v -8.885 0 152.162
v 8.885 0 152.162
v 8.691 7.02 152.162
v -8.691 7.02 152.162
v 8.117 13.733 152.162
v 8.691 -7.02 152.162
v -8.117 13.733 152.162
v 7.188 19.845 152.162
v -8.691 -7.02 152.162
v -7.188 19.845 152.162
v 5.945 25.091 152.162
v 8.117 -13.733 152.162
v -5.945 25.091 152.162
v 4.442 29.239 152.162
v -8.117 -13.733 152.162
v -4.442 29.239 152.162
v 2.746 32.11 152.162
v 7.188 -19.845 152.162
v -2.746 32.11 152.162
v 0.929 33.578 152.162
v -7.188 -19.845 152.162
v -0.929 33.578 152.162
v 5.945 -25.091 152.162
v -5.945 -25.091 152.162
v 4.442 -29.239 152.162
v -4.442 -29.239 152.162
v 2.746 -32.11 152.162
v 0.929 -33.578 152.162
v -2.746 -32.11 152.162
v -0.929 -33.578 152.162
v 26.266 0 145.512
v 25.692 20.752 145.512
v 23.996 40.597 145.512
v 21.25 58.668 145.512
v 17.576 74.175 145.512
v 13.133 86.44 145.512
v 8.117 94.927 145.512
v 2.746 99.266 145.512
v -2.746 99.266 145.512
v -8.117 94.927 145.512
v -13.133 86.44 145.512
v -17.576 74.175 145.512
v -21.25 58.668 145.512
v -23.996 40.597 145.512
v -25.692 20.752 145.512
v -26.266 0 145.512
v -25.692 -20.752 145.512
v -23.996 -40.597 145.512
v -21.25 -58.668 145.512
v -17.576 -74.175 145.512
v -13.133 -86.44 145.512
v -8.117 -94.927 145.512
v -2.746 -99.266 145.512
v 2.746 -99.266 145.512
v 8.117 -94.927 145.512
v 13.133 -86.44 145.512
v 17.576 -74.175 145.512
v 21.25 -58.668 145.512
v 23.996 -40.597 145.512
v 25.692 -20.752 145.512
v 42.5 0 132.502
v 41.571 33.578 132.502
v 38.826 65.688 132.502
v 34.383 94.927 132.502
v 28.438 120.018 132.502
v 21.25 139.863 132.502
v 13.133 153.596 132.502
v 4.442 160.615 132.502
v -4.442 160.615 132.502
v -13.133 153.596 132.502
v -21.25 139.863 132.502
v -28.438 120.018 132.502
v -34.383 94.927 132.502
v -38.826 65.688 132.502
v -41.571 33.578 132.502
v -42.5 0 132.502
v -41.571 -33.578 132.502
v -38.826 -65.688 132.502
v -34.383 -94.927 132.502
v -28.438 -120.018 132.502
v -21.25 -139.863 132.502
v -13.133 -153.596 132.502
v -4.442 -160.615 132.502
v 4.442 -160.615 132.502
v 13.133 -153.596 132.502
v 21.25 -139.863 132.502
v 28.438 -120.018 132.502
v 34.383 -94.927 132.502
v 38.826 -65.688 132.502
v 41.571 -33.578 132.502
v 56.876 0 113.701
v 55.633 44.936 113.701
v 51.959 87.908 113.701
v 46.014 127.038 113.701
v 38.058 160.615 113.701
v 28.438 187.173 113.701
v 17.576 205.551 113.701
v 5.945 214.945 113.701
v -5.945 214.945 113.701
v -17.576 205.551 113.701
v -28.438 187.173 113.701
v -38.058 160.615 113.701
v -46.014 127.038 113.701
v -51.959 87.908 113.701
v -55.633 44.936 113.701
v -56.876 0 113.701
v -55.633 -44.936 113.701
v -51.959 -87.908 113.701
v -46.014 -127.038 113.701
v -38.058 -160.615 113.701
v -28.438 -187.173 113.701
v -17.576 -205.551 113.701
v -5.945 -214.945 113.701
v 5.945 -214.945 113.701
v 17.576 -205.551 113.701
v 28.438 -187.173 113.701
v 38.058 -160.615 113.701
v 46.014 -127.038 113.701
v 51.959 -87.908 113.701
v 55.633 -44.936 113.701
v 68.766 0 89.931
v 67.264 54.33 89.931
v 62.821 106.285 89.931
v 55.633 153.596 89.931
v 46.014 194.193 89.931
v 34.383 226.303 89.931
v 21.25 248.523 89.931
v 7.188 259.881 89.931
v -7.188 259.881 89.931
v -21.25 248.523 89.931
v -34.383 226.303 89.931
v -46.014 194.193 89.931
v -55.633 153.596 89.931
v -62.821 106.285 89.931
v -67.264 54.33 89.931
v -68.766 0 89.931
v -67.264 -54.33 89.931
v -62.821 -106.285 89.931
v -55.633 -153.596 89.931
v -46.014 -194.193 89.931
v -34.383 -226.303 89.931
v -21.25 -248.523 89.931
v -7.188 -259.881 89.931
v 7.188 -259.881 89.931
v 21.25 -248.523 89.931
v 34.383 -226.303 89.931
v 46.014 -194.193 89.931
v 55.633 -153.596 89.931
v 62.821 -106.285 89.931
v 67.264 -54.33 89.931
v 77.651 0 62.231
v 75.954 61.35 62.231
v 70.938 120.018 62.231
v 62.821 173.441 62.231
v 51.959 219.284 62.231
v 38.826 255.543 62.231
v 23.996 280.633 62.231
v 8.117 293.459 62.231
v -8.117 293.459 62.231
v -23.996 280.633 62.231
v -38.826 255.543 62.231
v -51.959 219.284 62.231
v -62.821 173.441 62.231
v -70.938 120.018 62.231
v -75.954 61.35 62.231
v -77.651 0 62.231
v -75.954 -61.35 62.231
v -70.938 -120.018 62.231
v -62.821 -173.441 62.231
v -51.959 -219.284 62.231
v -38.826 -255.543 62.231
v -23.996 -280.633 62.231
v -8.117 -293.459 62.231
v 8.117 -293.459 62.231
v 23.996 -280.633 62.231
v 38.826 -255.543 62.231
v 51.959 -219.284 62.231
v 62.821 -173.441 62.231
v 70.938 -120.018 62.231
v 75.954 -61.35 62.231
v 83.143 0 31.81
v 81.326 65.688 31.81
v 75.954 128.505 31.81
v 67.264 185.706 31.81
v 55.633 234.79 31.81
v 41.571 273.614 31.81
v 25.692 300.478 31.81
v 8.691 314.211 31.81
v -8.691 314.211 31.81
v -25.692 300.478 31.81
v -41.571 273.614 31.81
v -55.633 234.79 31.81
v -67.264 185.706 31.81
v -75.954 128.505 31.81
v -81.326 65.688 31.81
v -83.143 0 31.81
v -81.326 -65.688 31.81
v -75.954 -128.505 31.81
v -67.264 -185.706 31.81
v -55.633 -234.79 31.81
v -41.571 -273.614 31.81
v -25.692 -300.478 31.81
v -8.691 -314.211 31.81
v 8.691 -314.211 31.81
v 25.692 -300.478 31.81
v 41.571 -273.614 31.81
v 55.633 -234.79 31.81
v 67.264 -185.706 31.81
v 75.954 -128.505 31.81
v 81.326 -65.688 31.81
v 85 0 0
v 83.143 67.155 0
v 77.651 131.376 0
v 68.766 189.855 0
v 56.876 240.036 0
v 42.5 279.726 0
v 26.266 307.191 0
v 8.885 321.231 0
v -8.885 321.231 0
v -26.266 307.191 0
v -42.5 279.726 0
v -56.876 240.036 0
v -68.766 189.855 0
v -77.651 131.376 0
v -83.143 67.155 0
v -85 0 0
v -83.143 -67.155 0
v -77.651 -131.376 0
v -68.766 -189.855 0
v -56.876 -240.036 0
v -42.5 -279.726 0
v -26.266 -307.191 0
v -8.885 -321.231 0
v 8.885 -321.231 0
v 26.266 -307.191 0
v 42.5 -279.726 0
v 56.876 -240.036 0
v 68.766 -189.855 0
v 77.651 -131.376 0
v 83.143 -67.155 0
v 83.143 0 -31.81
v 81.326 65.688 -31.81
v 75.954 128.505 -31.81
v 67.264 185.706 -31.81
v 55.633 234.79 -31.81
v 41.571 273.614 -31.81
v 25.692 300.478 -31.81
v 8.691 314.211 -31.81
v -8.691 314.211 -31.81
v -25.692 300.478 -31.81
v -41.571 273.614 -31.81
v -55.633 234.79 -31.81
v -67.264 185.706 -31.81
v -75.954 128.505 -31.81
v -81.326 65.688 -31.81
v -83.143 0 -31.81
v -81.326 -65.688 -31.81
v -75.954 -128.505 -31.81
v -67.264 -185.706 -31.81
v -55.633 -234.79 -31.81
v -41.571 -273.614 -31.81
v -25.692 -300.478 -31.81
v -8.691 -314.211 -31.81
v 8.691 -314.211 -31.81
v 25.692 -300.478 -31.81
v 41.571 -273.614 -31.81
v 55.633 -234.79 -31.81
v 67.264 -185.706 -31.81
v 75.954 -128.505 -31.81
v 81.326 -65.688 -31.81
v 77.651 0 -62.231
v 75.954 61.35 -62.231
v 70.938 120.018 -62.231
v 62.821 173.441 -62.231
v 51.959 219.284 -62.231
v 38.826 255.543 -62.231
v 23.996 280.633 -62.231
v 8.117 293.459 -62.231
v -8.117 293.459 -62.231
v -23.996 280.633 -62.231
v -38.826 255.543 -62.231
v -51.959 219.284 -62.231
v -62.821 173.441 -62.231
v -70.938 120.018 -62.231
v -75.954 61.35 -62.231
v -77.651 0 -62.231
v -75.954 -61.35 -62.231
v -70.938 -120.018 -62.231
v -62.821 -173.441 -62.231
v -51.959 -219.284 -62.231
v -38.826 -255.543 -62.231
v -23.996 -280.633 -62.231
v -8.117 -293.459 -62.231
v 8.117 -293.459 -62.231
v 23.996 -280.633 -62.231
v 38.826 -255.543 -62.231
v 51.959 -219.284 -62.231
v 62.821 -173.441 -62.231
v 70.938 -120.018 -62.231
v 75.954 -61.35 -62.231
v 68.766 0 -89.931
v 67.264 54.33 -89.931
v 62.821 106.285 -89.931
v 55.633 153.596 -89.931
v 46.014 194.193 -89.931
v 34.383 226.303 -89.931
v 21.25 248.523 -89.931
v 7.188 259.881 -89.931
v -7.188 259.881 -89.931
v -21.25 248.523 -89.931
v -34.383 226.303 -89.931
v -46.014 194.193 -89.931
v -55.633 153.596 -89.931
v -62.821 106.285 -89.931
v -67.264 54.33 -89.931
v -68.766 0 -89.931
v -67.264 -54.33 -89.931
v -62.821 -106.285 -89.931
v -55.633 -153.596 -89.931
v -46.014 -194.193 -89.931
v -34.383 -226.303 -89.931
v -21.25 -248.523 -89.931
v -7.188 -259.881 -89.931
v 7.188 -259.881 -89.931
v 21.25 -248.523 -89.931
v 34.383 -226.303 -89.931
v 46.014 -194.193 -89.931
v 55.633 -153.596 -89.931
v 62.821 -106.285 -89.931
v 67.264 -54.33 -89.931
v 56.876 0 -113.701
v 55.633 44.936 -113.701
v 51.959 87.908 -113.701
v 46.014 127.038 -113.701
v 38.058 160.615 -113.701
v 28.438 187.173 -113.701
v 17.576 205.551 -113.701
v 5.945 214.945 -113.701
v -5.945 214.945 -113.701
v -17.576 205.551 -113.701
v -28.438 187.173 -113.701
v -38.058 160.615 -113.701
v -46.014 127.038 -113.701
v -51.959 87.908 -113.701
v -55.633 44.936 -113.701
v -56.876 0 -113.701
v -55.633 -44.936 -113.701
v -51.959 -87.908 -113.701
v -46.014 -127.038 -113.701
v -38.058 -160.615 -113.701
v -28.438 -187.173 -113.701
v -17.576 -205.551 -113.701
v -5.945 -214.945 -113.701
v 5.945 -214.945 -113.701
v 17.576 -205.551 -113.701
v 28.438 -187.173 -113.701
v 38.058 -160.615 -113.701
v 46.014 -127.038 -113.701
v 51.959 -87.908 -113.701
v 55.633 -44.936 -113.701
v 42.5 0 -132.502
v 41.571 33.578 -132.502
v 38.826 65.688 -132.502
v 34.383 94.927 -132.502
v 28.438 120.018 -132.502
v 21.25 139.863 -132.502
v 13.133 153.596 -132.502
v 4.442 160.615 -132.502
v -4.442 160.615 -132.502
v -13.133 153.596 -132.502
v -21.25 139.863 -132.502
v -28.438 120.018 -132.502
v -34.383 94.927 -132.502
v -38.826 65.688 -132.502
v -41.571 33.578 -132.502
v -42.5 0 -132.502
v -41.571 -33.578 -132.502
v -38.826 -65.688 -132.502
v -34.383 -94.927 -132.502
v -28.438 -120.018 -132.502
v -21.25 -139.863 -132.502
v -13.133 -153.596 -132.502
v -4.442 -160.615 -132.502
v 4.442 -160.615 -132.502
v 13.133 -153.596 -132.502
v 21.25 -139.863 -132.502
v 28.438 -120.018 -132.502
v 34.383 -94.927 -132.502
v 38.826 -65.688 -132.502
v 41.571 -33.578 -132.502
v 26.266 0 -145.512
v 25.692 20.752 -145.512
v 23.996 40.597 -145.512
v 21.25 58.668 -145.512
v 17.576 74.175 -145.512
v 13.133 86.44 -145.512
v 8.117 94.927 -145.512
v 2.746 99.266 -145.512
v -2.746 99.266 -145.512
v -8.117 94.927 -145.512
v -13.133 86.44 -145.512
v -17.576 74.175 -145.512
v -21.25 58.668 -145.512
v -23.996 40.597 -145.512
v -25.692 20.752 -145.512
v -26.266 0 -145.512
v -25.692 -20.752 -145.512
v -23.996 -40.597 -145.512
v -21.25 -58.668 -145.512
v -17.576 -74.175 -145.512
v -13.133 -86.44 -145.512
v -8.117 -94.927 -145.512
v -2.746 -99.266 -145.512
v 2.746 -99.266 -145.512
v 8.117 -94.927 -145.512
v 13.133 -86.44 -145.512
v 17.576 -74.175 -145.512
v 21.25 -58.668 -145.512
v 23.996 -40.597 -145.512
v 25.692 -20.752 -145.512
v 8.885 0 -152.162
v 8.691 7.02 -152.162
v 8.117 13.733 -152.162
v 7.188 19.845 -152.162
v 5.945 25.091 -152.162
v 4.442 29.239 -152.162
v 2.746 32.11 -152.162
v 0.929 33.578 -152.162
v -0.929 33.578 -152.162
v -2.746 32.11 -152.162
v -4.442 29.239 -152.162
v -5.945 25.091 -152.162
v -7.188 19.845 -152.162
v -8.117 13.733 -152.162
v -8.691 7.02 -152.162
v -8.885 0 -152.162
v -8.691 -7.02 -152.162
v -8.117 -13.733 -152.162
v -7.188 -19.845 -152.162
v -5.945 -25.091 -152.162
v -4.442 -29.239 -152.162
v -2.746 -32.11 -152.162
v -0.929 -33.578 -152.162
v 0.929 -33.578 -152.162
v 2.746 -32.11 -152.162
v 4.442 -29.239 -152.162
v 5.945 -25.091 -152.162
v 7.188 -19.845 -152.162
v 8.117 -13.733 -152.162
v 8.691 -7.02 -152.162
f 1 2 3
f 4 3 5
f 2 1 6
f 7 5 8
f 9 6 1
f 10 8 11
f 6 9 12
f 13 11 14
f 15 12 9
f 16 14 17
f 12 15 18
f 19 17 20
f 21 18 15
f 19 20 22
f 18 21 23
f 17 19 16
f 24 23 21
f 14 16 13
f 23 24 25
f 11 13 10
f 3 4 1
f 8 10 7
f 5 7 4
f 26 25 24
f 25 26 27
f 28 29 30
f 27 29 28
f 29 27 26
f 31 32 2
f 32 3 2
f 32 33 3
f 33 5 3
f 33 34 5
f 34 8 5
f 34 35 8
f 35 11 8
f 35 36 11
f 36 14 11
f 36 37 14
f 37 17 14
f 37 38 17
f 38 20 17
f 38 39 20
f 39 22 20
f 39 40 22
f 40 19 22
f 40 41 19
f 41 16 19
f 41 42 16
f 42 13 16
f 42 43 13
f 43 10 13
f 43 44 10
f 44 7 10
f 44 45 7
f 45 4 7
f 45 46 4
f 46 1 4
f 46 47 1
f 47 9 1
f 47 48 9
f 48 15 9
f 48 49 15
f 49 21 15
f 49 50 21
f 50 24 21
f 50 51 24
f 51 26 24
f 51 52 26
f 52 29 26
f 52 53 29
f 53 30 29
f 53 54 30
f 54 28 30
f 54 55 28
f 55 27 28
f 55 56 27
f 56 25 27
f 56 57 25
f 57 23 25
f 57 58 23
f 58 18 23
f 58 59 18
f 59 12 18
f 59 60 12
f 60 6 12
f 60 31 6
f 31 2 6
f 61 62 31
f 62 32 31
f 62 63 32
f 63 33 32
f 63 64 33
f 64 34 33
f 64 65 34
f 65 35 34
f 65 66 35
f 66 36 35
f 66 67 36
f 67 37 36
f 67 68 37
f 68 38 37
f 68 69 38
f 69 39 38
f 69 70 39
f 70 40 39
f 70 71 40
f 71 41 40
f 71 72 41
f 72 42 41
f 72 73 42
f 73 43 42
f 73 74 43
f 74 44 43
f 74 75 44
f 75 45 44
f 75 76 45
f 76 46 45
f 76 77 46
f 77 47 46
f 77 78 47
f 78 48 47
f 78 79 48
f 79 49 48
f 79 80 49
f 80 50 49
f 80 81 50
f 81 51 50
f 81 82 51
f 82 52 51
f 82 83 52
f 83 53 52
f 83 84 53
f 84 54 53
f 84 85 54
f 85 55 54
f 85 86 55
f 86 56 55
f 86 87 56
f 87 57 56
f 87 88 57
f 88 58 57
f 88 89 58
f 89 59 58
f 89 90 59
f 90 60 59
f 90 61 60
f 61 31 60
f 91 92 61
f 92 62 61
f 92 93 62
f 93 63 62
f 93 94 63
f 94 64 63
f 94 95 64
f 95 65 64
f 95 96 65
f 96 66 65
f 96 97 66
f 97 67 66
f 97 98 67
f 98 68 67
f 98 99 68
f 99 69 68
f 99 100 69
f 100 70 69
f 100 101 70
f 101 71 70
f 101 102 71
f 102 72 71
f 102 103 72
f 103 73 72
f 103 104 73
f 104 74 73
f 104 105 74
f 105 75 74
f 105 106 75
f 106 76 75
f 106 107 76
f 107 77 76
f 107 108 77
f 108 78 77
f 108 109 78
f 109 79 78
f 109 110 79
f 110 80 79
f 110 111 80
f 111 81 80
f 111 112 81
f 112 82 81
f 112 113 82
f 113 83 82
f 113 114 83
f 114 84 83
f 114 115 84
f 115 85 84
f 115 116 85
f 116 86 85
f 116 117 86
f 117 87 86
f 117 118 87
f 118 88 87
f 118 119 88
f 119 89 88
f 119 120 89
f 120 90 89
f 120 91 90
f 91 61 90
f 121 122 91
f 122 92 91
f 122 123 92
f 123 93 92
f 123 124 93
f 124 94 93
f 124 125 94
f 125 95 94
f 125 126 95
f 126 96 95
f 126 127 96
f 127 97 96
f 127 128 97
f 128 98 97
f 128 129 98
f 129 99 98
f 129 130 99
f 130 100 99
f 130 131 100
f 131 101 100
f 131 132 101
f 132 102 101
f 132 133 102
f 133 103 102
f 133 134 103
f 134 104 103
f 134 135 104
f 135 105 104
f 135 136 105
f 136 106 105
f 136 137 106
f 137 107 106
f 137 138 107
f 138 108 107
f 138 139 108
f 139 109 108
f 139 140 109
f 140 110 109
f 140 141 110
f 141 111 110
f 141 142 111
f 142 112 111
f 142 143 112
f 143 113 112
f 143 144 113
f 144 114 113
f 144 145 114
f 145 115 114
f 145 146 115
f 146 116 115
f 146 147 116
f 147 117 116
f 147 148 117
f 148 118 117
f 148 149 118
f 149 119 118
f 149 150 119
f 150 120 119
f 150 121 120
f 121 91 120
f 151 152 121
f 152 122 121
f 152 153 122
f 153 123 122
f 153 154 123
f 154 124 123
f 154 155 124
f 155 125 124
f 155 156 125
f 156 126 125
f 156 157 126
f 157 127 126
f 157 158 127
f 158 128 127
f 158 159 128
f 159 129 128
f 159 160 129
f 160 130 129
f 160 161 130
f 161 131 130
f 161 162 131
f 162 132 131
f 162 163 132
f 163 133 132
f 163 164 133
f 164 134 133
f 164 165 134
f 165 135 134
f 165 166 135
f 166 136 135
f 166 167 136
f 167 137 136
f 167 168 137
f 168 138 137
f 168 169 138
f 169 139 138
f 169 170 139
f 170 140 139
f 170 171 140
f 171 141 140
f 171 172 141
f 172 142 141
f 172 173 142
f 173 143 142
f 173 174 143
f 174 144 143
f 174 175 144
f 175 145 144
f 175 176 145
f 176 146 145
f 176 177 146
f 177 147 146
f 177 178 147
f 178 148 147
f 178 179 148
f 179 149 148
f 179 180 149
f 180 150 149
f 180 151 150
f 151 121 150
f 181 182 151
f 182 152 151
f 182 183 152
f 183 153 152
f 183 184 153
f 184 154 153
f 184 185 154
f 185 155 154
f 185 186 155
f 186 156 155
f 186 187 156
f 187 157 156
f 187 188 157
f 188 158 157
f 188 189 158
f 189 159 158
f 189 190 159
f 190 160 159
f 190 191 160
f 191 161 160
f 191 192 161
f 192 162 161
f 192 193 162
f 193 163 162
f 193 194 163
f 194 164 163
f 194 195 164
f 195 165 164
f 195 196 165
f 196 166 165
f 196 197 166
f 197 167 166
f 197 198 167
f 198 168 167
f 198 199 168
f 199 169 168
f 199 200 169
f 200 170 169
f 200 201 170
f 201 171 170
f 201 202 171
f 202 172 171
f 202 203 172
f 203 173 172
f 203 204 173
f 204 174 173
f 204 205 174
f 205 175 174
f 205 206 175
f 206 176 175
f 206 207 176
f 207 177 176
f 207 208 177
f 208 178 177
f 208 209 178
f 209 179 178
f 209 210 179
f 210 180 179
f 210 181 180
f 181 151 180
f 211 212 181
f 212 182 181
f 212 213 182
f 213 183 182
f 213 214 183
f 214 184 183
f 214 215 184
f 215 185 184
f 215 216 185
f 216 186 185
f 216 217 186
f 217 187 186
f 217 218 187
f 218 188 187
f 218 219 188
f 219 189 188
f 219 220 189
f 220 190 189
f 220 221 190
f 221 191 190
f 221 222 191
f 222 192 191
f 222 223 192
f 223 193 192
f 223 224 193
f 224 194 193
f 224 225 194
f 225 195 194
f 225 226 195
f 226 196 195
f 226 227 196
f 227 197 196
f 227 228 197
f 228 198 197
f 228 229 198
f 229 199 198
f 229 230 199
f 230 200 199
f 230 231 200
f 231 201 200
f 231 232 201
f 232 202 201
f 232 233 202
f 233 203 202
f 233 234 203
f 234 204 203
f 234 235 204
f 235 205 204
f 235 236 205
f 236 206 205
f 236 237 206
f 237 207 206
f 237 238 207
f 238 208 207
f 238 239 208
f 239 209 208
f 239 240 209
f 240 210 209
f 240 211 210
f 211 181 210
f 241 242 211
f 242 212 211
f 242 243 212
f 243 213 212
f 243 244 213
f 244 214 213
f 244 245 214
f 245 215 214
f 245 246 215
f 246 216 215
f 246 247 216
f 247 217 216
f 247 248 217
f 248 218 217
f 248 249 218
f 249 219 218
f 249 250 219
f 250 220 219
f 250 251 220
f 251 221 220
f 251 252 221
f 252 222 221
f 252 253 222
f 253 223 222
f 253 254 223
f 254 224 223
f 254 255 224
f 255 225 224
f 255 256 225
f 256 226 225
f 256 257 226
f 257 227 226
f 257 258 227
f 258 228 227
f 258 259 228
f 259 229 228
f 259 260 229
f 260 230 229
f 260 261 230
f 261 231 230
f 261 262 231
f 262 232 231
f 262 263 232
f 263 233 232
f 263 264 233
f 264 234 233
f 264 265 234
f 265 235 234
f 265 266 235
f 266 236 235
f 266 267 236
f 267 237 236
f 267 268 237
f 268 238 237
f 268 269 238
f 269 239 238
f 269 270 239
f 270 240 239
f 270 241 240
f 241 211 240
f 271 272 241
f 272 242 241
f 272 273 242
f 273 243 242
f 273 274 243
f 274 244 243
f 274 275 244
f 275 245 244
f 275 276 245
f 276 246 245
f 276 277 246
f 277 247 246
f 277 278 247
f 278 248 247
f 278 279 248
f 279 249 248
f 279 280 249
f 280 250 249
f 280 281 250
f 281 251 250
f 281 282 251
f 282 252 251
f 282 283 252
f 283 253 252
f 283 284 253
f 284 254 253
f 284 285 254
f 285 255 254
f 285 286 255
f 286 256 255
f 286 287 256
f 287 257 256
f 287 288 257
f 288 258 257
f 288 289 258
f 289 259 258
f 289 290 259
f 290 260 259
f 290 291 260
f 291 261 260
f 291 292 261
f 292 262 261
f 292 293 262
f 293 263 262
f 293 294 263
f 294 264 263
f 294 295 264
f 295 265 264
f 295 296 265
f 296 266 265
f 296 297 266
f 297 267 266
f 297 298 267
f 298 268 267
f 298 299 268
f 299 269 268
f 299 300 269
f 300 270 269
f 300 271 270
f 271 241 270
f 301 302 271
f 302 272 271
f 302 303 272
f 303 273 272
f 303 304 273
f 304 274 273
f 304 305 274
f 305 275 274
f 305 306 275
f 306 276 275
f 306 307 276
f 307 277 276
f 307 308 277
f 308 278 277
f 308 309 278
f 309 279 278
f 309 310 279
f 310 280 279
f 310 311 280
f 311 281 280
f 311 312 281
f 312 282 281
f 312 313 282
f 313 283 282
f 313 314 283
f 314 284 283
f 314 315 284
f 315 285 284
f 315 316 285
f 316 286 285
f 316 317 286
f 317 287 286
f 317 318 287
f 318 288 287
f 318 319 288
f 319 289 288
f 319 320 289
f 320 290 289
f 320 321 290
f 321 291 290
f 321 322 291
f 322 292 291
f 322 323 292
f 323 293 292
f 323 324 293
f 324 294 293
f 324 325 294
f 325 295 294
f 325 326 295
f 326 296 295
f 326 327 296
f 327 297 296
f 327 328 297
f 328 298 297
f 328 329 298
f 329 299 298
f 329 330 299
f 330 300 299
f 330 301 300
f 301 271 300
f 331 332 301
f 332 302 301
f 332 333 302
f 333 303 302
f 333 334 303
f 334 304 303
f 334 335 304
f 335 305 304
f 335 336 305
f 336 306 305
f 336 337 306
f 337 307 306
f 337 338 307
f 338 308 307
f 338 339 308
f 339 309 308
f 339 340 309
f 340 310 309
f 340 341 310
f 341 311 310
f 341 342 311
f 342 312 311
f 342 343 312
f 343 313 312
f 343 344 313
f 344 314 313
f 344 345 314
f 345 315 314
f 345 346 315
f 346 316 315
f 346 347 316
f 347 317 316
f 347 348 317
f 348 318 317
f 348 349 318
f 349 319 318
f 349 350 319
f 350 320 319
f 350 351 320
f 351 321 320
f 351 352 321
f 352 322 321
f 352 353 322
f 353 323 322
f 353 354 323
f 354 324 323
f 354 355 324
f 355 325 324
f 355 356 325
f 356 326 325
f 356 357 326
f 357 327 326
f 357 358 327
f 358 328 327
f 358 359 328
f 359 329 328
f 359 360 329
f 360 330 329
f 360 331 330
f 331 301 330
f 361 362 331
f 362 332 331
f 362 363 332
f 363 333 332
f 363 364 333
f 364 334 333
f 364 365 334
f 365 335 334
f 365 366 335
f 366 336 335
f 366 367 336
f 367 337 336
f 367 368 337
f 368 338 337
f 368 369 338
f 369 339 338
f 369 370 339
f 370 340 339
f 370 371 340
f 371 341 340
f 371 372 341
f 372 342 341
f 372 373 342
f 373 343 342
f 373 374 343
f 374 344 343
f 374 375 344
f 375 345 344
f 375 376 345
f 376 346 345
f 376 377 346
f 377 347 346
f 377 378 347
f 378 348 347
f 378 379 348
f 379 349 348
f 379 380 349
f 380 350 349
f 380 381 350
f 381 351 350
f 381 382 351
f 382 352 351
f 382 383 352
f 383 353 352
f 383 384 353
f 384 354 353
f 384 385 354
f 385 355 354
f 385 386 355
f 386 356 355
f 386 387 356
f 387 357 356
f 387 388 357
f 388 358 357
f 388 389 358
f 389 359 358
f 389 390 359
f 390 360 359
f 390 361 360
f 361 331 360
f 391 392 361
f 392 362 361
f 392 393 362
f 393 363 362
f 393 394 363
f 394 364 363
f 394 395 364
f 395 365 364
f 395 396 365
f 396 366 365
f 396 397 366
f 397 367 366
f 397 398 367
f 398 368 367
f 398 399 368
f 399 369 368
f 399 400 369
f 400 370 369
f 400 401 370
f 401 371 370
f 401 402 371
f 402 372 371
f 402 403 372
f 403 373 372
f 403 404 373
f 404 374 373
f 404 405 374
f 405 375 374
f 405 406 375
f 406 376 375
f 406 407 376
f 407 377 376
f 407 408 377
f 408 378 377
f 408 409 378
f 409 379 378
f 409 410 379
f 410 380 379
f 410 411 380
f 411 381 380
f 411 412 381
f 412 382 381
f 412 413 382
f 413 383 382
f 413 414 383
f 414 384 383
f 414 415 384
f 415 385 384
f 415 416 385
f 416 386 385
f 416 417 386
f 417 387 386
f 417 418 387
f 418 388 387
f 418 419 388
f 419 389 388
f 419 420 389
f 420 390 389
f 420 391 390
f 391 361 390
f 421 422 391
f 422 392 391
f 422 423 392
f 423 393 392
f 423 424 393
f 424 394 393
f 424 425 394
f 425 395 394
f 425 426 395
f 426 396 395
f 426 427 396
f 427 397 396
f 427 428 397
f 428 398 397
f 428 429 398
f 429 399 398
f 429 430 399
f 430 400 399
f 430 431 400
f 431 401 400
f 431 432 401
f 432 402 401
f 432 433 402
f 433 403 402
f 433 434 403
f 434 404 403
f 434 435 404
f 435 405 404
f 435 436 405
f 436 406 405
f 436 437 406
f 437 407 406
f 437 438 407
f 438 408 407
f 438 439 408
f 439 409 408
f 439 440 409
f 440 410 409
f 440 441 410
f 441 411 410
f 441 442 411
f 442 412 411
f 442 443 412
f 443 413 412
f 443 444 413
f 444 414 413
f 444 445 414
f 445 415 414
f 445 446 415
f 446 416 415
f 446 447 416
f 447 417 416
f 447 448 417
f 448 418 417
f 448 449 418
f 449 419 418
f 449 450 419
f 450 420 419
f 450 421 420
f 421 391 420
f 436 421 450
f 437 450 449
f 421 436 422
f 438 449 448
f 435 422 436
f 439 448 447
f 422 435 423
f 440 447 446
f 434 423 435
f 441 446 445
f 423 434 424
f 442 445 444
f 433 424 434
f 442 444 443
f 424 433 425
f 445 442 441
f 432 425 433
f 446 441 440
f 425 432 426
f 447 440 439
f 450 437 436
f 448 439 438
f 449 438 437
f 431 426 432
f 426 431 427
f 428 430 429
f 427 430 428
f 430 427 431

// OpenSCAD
// Generated by SolidPython 1.0.1 on 2020-07-29 00:46:47


scale(v = [5, 19, 9]) {
	sphere(r = 17);
}
/***********************************************
*********      SolidPython code:      **********
************************************************
 
# import packages: SolidPython
from solid import *
from solid.utils import *
from itertools import chain, combinations, permutations


class Resize:

    def __init__(self, scad_file):
        self.scad_file = scad_file
        #self.scad_file = import_scad(scad_file)
        # cone/cylinder param:
        self.r1 = 0
        self.r2 = 0
        self.h = 0
        # rectangular prism param:
        self.w = 0
        self.l = 0
        # ellipse param:
        self.r = 0

    # import OpenScad code (file name corresponds to shape)


    # classify shape + parameters
    def assign(self, param1, param2, param3):
        if self.scad_file == 'cone.scad':
            self.r1 = param1
            self.r2 = param2
            self.h = param3
        elif self.scad_file == 'cylinder.scad':
            self.r1 = param1
            self.r2 = param2
            self.h = param3
        elif self.scad_file == 'rectangularPrism.scad':
            self.h = param1
            self.l = param2
            self.w = param3
        else:
            self.r = param1
            self.h = param2

    # resize parameters
    def iterate(self):
        x = range(3, 20, 2)
        i = 1
        if self.scad_file == 'cone.scad':
            tempList = list(permutations(x, 2))
            for temp in tempList:
                param1 = temp[0]
                param2 = temp[1]
                filepath = 'produced_scad_files/' + 'cone' + str(param1) + '_' + str(param2) + '_' + '.scad'
                scad_render_to_file(cylinder(h=param1, r1=param2, r2=0), filepath)

        elif self.scad_file == 'cylinder.scad':
            tempList = list(permutations(x, 3))
            for temp in tempList:
                param1 = temp[0]
                param2 = temp[1]
                filepath = 'produced_scad_files/' + 'cylinder' + str(param1) + '_' + str(param2) + '_' + '.scad'
                scad_render_to_file(cylinder(h=param1, r1=param2, r2=param2), filepath)

        elif self.scad_file == 'rectangularPrism.scad':
            tempList = list(permutations(x, 3))
            for temp in tempList:
                param1 = temp[0]
                param2 = temp[1]
                param3 = temp[2]
                filepath = 'produced_scad_files/' + 'rectangularPrism' + str(param1) + '_' + str(param2) + '_' + str(
                    param3) + '.scad'
                scad_render_to_file(cube(size=(param1, param2, param3)), filepath)

        elif self.scad_file == 'ellipse.scad':
            tempList = list(permutations(x, 4))
            for temp in tempList:
                param1 = temp[0]
                param2 = temp[1]
                param3 = temp[2]
                param4 = temp[3]
                filepath = 'produced_scad_files/' + 'ellipse' + str(param1) + '_' + str(param2) + '_' + str(param3) + '_' + str(param4) + '.scad'
                scad_render_to_file(scale([param1, param2, param3])(sphere(r=param4)), filepath)

    def render_to_scadfile(self):
        scad_render_to_file(scad, 'example.scad') 
 
************************************************/
